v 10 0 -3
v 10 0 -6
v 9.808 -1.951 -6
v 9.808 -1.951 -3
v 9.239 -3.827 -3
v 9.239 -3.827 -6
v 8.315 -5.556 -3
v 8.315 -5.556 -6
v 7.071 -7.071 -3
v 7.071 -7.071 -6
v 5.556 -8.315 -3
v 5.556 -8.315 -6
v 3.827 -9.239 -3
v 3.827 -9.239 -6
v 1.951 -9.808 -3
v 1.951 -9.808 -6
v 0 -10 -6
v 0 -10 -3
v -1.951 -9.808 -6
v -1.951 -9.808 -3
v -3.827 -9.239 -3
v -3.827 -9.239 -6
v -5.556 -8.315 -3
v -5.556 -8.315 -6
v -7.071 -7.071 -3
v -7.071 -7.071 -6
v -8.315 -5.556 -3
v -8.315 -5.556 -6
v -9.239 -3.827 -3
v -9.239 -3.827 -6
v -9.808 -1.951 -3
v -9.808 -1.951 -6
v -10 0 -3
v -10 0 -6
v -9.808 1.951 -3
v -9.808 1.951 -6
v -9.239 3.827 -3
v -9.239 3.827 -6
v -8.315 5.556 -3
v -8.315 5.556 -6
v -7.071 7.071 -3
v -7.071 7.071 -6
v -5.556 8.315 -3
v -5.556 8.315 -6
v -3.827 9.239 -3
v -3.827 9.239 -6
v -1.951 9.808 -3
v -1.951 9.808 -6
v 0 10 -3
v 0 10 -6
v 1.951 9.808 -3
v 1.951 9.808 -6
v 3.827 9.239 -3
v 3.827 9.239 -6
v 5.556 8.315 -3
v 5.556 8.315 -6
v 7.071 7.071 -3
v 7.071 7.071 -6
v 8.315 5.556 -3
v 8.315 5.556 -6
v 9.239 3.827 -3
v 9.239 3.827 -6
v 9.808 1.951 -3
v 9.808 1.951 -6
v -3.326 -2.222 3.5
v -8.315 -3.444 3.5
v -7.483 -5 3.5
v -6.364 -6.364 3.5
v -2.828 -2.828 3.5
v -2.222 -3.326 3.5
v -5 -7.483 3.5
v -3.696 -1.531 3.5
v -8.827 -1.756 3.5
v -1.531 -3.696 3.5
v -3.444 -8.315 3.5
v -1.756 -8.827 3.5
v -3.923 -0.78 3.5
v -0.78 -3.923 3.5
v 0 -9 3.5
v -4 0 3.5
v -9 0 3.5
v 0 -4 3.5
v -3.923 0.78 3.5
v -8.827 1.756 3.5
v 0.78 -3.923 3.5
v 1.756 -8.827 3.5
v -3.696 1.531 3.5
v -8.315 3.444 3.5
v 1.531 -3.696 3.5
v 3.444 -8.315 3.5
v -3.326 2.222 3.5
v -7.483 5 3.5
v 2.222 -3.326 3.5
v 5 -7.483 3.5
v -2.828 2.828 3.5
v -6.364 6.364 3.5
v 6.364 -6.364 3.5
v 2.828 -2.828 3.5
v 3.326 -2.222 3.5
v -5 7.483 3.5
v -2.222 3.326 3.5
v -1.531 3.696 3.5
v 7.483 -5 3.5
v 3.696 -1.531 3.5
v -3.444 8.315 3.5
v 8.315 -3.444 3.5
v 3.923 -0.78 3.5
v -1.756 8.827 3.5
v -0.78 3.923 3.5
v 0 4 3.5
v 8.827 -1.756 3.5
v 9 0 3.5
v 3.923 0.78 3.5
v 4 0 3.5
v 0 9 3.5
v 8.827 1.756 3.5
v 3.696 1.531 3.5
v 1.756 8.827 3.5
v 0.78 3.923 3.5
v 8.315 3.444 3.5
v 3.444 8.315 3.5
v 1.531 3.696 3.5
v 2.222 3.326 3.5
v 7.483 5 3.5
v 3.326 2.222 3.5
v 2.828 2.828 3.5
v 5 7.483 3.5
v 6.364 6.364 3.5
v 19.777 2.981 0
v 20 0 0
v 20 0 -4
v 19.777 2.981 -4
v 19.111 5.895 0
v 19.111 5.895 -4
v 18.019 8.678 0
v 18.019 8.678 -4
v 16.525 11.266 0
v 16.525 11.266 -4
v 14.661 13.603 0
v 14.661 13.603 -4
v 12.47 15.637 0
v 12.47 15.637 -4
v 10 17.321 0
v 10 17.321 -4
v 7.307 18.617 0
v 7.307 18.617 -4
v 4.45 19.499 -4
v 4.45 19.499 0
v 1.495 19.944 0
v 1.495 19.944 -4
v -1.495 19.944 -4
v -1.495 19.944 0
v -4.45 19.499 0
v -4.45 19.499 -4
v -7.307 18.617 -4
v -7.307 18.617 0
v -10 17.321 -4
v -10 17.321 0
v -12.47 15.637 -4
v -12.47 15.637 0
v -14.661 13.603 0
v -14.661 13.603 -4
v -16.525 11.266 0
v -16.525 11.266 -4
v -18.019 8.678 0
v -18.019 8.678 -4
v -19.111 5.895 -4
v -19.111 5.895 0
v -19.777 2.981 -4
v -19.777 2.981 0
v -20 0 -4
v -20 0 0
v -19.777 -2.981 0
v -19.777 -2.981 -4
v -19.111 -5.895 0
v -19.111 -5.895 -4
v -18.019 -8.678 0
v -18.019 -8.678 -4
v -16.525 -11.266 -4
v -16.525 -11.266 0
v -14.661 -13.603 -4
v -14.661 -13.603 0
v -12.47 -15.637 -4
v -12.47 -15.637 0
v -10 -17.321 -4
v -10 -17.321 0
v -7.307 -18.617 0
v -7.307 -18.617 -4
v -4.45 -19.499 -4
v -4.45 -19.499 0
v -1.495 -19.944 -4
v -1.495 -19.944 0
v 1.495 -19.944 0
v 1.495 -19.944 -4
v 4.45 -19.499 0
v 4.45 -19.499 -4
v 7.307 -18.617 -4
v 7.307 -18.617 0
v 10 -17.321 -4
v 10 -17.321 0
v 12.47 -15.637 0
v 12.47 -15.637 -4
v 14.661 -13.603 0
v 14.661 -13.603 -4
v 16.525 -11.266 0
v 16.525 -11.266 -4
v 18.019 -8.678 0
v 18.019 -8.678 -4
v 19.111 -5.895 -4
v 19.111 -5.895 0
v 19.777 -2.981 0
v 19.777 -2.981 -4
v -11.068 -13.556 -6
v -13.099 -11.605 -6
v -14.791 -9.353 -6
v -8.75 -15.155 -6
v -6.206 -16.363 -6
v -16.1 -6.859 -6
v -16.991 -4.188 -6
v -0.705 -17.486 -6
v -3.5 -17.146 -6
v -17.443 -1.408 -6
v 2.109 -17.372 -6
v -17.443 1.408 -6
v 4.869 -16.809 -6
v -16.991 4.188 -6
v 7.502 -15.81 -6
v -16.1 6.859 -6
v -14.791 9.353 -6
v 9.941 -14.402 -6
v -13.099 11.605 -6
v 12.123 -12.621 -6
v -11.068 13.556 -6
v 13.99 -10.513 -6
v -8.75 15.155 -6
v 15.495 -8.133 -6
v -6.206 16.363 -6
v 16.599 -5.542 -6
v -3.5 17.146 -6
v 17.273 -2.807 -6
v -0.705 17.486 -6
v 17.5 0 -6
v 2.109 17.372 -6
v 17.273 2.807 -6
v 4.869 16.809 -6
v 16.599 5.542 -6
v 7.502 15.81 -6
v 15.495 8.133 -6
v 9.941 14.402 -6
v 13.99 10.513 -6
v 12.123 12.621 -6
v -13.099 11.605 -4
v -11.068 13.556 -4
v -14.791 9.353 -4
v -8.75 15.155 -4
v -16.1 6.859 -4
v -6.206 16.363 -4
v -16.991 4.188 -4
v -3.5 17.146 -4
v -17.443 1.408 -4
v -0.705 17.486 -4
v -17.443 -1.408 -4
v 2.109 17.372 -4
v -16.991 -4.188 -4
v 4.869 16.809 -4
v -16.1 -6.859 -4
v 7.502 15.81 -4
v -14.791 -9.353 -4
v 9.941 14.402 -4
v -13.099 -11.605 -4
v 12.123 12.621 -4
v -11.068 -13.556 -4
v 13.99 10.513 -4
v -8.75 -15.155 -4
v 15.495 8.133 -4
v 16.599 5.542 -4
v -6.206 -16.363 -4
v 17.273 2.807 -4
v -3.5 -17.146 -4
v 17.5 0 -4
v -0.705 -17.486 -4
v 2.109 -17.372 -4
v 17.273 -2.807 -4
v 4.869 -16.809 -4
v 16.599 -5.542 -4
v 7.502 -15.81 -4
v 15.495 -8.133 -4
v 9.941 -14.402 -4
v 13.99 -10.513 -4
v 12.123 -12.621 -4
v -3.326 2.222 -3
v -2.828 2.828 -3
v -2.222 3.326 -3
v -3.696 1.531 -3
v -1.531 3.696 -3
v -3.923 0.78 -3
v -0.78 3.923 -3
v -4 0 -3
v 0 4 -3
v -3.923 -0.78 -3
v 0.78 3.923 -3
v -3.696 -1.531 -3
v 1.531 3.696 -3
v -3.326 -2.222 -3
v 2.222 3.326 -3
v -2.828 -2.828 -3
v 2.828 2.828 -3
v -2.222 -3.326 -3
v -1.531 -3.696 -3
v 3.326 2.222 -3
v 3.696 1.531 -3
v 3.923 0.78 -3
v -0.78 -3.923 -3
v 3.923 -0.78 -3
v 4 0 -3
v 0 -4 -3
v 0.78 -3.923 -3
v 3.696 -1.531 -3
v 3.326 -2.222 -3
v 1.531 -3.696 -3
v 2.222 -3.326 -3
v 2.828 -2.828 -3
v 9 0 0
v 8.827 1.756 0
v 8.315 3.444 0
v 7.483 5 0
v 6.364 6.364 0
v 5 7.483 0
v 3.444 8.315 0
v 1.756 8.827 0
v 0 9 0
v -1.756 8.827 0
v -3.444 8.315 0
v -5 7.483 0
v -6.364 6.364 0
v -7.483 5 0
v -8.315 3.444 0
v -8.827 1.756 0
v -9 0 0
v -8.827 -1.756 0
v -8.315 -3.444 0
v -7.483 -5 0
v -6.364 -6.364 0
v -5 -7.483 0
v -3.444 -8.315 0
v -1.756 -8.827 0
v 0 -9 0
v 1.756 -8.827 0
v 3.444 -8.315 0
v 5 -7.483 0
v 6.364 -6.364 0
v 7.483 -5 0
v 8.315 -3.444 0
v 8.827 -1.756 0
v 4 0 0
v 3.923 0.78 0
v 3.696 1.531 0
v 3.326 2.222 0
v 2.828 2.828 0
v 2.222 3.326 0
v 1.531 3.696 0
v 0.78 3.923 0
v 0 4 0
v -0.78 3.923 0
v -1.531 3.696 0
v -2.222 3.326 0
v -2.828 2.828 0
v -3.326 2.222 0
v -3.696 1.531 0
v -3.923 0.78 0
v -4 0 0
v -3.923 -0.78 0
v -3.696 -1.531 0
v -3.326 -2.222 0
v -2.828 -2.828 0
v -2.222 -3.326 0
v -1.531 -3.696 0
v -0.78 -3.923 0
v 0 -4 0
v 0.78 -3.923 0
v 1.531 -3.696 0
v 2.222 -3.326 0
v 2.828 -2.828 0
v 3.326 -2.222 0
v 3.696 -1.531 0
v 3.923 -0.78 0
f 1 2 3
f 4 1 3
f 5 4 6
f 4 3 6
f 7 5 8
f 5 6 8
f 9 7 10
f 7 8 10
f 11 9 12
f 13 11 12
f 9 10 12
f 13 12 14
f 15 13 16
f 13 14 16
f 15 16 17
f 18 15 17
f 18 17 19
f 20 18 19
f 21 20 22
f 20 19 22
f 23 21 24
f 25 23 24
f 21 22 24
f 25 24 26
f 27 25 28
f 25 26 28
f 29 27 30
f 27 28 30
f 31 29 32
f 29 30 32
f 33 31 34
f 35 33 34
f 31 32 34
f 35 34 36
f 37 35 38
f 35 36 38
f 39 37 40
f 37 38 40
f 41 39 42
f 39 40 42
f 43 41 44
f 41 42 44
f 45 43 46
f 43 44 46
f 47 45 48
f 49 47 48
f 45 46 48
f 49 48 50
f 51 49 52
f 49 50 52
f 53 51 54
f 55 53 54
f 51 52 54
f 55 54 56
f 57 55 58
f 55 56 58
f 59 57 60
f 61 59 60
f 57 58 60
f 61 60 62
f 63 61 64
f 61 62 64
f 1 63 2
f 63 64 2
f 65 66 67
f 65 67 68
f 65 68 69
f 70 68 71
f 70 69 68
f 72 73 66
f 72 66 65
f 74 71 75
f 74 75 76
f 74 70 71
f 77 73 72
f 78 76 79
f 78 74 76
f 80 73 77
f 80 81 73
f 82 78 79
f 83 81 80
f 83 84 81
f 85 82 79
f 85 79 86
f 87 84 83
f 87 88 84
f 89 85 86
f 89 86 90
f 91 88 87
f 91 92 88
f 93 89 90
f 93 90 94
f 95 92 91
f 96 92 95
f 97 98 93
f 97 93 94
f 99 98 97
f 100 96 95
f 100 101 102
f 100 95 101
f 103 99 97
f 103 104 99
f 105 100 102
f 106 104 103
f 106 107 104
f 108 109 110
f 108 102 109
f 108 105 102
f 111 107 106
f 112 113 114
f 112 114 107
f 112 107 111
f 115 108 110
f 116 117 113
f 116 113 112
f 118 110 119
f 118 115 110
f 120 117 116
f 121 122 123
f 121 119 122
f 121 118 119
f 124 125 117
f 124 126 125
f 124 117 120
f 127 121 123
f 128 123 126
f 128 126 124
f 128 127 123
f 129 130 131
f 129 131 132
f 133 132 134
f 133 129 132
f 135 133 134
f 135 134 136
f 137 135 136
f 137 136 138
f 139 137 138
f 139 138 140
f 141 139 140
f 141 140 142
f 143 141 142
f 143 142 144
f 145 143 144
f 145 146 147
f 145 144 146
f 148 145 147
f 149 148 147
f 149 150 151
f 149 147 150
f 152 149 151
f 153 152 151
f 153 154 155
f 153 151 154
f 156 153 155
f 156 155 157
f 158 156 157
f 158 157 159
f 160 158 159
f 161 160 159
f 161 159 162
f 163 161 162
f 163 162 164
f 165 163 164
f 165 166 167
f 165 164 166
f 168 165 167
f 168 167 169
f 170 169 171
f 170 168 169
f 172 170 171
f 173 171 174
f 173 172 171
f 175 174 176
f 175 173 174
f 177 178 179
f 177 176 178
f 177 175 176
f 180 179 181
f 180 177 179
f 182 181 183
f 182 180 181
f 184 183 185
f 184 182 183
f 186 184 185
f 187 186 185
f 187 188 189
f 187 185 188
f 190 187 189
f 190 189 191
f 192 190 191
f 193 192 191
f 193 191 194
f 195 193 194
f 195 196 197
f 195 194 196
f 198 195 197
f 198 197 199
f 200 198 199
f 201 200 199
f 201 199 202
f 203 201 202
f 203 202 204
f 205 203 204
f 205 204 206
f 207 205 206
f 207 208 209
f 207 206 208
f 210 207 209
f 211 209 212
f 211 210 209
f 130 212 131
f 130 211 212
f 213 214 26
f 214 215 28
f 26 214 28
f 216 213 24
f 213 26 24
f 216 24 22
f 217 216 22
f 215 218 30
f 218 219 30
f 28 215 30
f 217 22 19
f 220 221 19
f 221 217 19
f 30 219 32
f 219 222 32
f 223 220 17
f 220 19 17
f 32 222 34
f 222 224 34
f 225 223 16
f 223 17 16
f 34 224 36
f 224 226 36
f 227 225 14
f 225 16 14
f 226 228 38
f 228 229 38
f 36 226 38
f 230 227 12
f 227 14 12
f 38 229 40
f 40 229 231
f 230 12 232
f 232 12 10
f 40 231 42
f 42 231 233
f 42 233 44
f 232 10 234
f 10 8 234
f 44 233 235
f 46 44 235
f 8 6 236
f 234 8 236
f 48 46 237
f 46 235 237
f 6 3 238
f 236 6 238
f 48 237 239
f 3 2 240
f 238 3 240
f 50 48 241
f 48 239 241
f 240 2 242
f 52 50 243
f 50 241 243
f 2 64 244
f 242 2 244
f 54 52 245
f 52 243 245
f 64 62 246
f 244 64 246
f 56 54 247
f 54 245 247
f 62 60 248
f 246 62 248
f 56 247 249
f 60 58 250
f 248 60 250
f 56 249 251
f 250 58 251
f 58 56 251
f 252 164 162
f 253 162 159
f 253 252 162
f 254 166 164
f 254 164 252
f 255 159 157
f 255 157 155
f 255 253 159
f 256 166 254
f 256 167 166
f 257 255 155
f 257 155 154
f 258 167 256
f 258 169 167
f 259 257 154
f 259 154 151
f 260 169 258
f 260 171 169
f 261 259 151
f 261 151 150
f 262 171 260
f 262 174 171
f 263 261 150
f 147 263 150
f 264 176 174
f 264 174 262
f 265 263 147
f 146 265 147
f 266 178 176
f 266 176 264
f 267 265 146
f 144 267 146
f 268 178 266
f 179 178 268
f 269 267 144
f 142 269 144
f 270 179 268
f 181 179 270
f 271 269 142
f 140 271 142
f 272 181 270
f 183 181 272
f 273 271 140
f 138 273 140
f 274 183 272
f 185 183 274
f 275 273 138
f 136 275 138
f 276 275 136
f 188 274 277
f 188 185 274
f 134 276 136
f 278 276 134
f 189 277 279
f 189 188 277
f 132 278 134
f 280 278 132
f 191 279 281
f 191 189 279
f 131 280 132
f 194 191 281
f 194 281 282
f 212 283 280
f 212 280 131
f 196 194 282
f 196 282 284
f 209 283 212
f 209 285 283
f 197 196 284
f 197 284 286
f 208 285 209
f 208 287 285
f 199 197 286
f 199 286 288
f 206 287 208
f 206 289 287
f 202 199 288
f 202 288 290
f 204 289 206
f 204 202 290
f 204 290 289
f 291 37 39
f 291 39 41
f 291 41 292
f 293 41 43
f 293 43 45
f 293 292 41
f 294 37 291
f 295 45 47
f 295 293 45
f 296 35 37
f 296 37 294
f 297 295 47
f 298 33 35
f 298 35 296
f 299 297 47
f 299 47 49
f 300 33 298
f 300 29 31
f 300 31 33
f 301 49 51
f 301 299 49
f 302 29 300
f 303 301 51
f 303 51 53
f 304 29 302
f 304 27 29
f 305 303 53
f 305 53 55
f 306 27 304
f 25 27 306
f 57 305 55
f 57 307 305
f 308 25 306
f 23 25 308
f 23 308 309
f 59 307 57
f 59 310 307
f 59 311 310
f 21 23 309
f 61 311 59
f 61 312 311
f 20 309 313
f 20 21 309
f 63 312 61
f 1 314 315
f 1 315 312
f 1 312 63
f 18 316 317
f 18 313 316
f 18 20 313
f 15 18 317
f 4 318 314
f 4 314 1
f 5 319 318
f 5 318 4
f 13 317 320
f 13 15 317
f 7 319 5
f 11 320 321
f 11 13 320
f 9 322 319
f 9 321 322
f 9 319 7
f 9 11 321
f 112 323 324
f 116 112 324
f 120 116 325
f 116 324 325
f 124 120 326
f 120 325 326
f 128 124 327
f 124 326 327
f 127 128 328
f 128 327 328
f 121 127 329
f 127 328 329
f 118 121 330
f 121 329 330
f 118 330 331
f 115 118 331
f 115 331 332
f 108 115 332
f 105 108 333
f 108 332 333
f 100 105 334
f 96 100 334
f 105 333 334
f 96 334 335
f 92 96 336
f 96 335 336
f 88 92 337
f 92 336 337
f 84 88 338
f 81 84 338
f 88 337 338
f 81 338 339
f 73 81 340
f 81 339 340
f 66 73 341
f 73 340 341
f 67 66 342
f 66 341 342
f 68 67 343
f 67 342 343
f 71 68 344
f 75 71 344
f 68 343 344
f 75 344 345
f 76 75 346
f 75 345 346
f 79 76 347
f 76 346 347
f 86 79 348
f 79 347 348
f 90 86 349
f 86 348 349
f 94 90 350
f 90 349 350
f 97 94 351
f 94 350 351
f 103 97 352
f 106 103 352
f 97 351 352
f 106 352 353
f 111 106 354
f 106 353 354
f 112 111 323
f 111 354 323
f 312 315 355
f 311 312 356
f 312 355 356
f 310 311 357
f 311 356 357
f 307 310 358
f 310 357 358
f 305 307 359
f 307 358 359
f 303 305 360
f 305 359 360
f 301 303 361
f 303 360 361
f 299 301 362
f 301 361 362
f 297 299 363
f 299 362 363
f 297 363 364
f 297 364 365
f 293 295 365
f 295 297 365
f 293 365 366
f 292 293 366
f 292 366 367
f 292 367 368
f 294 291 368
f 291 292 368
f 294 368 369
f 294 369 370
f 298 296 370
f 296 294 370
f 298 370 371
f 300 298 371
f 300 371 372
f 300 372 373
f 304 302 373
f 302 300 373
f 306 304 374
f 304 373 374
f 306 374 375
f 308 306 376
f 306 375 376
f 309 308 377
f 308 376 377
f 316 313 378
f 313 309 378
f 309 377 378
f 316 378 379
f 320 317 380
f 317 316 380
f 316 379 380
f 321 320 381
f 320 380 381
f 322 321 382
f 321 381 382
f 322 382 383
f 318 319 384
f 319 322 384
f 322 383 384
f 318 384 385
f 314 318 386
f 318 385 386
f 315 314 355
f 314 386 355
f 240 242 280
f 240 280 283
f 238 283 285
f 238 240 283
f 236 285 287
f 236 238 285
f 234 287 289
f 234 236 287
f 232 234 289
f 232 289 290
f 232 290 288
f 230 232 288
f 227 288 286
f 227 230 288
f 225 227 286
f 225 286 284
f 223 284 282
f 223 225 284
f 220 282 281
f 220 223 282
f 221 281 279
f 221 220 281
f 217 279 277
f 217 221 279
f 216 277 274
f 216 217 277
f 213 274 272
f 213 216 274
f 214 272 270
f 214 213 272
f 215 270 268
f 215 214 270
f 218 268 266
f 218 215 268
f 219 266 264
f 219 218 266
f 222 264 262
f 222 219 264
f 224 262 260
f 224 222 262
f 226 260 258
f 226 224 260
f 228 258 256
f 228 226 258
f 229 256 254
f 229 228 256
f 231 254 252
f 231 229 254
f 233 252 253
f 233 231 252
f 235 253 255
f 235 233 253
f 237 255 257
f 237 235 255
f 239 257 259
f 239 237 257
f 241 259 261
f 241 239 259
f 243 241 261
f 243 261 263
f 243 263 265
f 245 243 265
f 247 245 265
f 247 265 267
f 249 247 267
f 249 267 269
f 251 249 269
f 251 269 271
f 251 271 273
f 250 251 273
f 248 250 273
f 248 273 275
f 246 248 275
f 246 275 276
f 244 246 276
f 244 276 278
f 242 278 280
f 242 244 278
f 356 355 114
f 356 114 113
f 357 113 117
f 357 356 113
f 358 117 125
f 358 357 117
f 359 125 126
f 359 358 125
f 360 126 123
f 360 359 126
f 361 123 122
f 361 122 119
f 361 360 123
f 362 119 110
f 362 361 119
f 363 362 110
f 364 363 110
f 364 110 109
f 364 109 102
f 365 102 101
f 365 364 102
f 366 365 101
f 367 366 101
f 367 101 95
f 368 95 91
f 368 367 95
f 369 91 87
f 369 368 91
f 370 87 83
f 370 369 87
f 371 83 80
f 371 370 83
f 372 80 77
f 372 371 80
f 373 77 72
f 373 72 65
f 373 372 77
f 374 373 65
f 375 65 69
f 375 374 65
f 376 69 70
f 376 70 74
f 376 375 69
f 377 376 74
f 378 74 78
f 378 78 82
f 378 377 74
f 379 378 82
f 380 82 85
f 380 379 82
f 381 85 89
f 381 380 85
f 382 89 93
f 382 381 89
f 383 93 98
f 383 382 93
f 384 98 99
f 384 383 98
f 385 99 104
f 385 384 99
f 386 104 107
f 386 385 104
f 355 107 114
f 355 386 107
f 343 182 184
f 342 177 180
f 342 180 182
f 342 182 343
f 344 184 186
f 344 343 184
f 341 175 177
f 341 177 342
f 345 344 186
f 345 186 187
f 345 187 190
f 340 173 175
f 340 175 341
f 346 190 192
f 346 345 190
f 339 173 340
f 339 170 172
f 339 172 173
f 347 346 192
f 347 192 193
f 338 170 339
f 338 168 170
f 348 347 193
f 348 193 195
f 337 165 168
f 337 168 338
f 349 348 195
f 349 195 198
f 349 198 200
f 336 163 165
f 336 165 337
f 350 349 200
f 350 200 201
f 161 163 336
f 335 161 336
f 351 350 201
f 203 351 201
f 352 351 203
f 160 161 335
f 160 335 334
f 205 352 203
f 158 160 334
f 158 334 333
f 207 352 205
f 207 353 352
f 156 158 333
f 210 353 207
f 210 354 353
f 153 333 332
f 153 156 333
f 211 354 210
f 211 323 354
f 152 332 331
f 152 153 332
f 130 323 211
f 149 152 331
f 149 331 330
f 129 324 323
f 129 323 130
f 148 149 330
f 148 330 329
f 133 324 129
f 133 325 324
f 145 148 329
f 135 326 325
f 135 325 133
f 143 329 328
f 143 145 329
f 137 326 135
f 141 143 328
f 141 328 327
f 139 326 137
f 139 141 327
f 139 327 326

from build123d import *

# Parameters (mm, degrees)
F0_R     = 9
F0_R_2   = 4
F1_DEPTH = 3.5
F0_R_3   = 20
F2_DEPTH = 6
F3_R     = 10
F3_R_2   = 4
F4_DEPTH = 3
F3_R_3   = 20
F3_R_4   = 17.5
F5_DEPTH = 2


with BuildPart() as f1:
    # F0 (on Top) → F1 (new body)
    with BuildSketch(Plane.XY):
        Circle(F0_R)
        Circle(F0_R_2, mode=Mode.SUBTRACT)
    extrude(amount=F1_DEPTH)

    # F0 (on Top) → F2 (join)
    with BuildSketch(Plane.XY):
        Circle(F0_R_3)
        Circle(F0_R, mode=Mode.SUBTRACT)
        Circle(F0_R)
        Circle(F0_R_2, mode=Mode.SUBTRACT)
    extrude(amount=-F2_DEPTH)

    # F3 (on face) → F4 (cut)
    with BuildSketch(Plane(origin=(0, 0, -6), x_dir=(1, 0, 0), z_dir=(0, 0, -1))):
        Circle(F3_R)
        Circle(F3_R_2, mode=Mode.SUBTRACT)
    extrude(amount=-F4_DEPTH, mode=Mode.SUBTRACT)

    # F3 (on face) → F5 (cut)
    with BuildSketch(Plane(origin=(0, 0, -6), x_dir=(1, 0, 0), z_dir=(0, 0, -1))):
        Circle(F3_R_3)
        Circle(F3_R_4, mode=Mode.SUBTRACT)
    extrude(amount=-F5_DEPTH, mode=Mode.SUBTRACT)


solid = f1.part
